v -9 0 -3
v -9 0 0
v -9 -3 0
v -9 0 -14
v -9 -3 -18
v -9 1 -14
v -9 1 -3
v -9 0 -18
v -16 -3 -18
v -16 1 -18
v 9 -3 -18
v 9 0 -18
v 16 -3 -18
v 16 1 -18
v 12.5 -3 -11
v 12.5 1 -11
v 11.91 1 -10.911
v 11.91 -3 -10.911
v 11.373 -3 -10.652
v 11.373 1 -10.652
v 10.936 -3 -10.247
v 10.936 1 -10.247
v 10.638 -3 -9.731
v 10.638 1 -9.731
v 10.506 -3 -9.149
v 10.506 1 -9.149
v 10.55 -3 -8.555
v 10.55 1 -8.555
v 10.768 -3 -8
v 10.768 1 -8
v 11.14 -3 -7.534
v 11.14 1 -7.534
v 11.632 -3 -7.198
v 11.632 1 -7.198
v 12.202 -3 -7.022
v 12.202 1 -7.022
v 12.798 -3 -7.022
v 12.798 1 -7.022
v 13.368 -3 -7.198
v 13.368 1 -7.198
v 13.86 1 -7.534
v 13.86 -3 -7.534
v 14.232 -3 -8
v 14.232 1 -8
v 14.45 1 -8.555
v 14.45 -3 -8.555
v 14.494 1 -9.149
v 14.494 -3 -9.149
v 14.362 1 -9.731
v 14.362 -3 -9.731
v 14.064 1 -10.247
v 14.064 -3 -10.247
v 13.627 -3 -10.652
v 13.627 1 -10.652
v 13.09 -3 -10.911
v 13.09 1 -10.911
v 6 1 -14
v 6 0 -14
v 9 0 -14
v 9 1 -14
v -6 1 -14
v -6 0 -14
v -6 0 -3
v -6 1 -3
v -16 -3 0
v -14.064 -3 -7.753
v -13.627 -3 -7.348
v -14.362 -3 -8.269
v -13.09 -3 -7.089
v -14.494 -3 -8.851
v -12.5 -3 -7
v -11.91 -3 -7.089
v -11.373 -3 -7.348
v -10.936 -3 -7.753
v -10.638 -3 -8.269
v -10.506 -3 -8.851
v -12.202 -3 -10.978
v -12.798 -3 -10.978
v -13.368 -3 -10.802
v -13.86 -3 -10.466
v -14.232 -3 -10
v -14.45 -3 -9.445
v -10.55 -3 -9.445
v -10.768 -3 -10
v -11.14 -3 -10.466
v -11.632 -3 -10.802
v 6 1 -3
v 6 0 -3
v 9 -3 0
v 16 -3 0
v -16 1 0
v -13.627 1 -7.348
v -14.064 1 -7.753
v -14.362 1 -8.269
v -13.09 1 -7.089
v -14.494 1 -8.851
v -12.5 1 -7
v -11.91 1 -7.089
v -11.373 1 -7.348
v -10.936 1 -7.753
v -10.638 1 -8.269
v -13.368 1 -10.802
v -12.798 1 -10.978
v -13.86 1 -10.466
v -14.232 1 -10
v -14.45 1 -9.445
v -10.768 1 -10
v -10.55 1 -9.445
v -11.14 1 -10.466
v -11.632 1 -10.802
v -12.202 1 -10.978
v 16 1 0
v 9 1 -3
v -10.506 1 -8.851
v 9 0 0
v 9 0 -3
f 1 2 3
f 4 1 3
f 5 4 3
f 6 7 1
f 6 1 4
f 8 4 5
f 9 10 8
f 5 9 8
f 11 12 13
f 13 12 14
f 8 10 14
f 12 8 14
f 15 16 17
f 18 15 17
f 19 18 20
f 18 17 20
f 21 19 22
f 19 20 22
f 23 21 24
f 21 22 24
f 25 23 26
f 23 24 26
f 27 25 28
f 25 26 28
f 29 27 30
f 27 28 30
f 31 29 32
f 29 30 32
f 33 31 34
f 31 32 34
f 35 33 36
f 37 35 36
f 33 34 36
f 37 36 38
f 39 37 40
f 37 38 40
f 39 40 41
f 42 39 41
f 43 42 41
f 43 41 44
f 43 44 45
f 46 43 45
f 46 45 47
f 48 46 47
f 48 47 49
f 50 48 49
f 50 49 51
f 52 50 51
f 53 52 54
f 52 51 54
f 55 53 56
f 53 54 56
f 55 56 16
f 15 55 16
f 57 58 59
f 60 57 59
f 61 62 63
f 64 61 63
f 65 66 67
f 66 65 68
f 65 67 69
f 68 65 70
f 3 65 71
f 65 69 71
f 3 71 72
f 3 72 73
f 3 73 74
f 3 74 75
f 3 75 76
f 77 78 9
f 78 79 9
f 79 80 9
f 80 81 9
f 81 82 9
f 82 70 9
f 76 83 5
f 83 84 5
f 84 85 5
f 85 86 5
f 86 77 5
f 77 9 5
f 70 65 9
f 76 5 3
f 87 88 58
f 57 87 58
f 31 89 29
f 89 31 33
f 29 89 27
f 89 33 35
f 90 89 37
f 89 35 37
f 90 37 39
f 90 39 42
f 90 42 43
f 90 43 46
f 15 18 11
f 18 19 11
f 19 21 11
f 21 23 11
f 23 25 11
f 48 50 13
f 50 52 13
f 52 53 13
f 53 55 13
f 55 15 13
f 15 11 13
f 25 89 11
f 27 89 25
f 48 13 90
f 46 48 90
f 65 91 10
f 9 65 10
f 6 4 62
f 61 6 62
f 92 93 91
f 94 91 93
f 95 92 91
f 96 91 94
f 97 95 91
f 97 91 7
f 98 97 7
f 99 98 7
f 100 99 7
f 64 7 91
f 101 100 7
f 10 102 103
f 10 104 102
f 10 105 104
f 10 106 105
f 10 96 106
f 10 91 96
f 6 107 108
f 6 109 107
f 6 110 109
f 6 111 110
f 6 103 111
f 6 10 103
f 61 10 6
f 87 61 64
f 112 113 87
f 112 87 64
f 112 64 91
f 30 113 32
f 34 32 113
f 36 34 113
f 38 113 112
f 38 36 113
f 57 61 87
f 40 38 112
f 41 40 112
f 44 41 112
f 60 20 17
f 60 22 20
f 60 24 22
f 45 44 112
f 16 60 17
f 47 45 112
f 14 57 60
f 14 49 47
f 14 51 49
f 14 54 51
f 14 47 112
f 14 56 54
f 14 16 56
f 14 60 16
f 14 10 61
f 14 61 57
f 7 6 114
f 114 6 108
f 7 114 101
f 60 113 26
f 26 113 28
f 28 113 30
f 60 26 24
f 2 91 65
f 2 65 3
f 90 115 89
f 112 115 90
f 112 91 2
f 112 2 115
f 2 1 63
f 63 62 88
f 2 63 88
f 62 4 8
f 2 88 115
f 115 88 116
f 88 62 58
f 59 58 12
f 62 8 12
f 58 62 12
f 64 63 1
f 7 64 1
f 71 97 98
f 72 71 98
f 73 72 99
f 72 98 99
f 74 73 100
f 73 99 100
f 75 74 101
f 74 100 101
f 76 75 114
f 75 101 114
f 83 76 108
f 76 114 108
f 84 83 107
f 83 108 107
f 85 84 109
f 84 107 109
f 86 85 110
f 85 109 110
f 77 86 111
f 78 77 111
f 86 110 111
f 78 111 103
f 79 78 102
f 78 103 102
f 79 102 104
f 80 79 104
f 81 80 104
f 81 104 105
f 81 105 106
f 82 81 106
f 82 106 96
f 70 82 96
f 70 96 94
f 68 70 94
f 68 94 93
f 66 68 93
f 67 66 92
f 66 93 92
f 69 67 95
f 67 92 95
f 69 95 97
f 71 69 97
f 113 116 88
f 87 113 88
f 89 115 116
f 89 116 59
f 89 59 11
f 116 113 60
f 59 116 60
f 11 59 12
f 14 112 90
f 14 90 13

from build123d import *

# Parameters (mm, degrees)
BOSS_EXTRUDE1_DEPTH = 1
SKETCH2_W           = 7
SKETCH2_H           = 18
SKETCH2_R           = 2
BOSS_EXTRUDE2_DEPTH = 4


with BuildPart() as part:
    # Sketch1 → Boss-Extrude1 (new body)
    with BuildSketch(Plane(origin=(0, 0, 0), x_dir=(1, 0, 0), z_dir=(0, 1, 0))):
        Polygon((-9, 0), (9, 0), (9, 3), (6, 3), (6, 14), (9, 14), (9, 18), (-9, 18), (-9, 14), (-6, 14), (-6, 3), (-9, 3), align=None)
    extrude(amount=BOSS_EXTRUDE1_DEPTH)

    # Sketch2 → Boss-Extrude2 (add)
    # profile 1 of 2: a face of its own
    with BuildSketch(Plane(origin=(0, 1, 0), x_dir=(1, 0, 0), z_dir=(0, 1, 0))):
        with Locations((-12.5, 9)):
            Rectangle(SKETCH2_W, SKETCH2_H)
        with Locations(Location((-12.5, 9, 0), (0, 0, 270))):
            Circle(SKETCH2_R, mode=Mode.SUBTRACT)
    # profile 2 of 2: a face of its own
    with BuildSketch(Plane(origin=(0, 1, 0), x_dir=(1, 0, 0), z_dir=(0, 1, 0))):
        with Locations((12.5, 9)):
            Rectangle(SKETCH2_W, SKETCH2_H)
        with Locations(Location((12.5, 9, 0), (0, 0, 90))):
            Circle(SKETCH2_R, mode=Mode.SUBTRACT)
    extrude(amount=-BOSS_EXTRUDE2_DEPTH)


solid = part.part
